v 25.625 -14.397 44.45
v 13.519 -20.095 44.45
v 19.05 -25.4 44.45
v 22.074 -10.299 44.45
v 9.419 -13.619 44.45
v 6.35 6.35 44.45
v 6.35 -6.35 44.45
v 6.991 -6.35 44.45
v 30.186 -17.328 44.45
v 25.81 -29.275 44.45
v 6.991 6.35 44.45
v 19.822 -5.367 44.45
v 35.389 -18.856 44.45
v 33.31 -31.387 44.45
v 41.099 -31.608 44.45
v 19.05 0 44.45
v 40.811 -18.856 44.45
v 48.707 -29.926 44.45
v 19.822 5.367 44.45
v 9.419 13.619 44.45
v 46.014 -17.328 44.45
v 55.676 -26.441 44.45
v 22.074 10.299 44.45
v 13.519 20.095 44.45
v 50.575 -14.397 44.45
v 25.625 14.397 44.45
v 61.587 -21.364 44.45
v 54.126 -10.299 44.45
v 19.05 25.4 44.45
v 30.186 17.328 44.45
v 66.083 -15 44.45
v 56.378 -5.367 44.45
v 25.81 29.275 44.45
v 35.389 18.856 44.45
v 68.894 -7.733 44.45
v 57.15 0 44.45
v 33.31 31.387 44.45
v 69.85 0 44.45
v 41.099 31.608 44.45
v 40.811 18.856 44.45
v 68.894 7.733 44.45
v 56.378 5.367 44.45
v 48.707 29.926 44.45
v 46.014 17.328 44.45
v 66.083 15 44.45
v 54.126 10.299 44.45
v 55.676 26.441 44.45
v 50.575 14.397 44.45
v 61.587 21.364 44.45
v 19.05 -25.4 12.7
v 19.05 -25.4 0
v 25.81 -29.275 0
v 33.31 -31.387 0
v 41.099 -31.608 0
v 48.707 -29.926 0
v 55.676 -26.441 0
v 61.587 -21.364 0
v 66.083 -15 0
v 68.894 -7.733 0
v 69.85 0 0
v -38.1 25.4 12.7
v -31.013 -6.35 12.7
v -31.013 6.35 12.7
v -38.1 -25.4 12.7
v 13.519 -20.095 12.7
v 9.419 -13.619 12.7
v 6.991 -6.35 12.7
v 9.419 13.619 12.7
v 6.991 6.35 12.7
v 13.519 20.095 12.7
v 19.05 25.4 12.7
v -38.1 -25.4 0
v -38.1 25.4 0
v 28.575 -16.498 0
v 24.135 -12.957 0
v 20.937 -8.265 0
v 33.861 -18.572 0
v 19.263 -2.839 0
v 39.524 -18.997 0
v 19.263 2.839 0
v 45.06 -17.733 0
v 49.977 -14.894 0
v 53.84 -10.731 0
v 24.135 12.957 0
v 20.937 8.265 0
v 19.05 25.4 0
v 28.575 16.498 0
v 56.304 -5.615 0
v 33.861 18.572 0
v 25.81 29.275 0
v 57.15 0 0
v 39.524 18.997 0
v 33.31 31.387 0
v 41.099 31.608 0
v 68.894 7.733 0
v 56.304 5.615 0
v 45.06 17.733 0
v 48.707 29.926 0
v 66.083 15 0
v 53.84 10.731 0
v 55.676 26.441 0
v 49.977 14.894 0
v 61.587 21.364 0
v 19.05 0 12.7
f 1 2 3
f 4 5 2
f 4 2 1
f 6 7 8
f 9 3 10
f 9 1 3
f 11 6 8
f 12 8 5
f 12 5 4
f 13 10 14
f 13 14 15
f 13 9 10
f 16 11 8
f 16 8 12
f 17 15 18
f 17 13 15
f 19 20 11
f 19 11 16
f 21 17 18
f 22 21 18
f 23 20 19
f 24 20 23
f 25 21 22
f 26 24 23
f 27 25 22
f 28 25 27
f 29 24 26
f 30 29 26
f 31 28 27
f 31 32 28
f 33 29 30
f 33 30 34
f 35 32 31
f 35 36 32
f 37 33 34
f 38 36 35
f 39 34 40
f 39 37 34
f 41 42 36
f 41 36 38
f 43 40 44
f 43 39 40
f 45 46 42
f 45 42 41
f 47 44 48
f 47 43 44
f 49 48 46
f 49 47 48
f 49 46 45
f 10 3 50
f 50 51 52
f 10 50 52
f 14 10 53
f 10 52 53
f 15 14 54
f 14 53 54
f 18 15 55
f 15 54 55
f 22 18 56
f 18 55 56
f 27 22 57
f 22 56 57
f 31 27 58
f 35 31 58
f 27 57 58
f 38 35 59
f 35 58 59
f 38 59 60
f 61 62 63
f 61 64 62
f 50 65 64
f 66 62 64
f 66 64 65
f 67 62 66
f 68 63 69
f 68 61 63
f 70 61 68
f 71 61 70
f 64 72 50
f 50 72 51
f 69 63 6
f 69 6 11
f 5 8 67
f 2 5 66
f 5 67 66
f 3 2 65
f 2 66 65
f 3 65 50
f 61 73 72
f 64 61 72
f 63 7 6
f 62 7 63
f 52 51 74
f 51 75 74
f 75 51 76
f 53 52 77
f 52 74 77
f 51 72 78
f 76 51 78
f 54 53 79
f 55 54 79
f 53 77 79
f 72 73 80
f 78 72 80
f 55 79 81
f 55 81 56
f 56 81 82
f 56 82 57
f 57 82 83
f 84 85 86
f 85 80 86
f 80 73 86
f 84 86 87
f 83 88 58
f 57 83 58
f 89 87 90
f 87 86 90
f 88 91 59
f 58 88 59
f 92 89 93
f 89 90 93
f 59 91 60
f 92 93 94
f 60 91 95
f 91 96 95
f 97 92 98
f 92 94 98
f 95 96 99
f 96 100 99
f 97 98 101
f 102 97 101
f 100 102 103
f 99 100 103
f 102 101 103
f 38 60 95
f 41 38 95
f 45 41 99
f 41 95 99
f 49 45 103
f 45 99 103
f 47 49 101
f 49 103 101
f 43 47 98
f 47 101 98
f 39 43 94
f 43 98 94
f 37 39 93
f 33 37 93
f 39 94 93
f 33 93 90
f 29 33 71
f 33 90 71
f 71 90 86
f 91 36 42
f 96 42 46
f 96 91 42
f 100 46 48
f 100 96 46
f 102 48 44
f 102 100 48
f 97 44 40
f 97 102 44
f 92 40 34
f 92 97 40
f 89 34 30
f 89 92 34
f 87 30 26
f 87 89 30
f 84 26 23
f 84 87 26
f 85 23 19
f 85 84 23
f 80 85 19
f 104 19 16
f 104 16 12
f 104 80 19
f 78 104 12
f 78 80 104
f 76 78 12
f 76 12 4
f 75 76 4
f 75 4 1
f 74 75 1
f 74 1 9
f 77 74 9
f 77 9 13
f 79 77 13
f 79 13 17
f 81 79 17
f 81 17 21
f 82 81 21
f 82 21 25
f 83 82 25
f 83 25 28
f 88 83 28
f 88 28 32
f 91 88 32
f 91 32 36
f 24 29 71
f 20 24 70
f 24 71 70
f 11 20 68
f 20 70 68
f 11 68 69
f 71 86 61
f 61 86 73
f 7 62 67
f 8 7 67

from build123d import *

# Parameters (mm, degrees)
F1_DEPTH = 12.7
F0_R     = 19.05
F2_DEPTH = 44.45
F4_DEPTH = 6.35


with BuildPart() as f1:
    # F0 (on Top) → F1 (new body)
    with BuildSketch(Plane.XY):
        with BuildLine():
            Line((-38.1, -25.4), (19.05, -25.4))
            ThreePointArc((19.05, -25.4), (6.35, 0), (19.05, 25.4))
            Line((19.05, 25.4), (-38.1, 25.4))
            Line((-38.1, 25.4), (-38.1, -25.4))
        make_face()
    extrude(amount=F1_DEPTH)

    # F0 (on Top) → F2 (join)
    with BuildSketch(Plane.XY):
        with BuildLine():
            ThreePointArc((19.05, 25.4), (6.35, 0), (19.05, -25.4))
            ThreePointArc((19.05, -25.4), (52.299032, -28.398063), (69.85, 0))
            ThreePointArc((69.85, 0), (52.299032, 28.398063), (19.05, 25.4))
        make_face()
        with Locations((38.1, 0)):
            Circle(F0_R, mode=Mode.SUBTRACT)
    extrude(amount=F2_DEPTH)

    # F3 (on Front) → F4 (join, symmetric)
    with BuildSketch(Plane.XZ):
        Polygon((6.35, 12.7), (19.05, 12.7), (19.05, 44.45), (6.35, 44.45), (-31.013487, 12.7), align=None)
    extrude(amount=F4_DEPTH, both=True)


solid = f1.part
